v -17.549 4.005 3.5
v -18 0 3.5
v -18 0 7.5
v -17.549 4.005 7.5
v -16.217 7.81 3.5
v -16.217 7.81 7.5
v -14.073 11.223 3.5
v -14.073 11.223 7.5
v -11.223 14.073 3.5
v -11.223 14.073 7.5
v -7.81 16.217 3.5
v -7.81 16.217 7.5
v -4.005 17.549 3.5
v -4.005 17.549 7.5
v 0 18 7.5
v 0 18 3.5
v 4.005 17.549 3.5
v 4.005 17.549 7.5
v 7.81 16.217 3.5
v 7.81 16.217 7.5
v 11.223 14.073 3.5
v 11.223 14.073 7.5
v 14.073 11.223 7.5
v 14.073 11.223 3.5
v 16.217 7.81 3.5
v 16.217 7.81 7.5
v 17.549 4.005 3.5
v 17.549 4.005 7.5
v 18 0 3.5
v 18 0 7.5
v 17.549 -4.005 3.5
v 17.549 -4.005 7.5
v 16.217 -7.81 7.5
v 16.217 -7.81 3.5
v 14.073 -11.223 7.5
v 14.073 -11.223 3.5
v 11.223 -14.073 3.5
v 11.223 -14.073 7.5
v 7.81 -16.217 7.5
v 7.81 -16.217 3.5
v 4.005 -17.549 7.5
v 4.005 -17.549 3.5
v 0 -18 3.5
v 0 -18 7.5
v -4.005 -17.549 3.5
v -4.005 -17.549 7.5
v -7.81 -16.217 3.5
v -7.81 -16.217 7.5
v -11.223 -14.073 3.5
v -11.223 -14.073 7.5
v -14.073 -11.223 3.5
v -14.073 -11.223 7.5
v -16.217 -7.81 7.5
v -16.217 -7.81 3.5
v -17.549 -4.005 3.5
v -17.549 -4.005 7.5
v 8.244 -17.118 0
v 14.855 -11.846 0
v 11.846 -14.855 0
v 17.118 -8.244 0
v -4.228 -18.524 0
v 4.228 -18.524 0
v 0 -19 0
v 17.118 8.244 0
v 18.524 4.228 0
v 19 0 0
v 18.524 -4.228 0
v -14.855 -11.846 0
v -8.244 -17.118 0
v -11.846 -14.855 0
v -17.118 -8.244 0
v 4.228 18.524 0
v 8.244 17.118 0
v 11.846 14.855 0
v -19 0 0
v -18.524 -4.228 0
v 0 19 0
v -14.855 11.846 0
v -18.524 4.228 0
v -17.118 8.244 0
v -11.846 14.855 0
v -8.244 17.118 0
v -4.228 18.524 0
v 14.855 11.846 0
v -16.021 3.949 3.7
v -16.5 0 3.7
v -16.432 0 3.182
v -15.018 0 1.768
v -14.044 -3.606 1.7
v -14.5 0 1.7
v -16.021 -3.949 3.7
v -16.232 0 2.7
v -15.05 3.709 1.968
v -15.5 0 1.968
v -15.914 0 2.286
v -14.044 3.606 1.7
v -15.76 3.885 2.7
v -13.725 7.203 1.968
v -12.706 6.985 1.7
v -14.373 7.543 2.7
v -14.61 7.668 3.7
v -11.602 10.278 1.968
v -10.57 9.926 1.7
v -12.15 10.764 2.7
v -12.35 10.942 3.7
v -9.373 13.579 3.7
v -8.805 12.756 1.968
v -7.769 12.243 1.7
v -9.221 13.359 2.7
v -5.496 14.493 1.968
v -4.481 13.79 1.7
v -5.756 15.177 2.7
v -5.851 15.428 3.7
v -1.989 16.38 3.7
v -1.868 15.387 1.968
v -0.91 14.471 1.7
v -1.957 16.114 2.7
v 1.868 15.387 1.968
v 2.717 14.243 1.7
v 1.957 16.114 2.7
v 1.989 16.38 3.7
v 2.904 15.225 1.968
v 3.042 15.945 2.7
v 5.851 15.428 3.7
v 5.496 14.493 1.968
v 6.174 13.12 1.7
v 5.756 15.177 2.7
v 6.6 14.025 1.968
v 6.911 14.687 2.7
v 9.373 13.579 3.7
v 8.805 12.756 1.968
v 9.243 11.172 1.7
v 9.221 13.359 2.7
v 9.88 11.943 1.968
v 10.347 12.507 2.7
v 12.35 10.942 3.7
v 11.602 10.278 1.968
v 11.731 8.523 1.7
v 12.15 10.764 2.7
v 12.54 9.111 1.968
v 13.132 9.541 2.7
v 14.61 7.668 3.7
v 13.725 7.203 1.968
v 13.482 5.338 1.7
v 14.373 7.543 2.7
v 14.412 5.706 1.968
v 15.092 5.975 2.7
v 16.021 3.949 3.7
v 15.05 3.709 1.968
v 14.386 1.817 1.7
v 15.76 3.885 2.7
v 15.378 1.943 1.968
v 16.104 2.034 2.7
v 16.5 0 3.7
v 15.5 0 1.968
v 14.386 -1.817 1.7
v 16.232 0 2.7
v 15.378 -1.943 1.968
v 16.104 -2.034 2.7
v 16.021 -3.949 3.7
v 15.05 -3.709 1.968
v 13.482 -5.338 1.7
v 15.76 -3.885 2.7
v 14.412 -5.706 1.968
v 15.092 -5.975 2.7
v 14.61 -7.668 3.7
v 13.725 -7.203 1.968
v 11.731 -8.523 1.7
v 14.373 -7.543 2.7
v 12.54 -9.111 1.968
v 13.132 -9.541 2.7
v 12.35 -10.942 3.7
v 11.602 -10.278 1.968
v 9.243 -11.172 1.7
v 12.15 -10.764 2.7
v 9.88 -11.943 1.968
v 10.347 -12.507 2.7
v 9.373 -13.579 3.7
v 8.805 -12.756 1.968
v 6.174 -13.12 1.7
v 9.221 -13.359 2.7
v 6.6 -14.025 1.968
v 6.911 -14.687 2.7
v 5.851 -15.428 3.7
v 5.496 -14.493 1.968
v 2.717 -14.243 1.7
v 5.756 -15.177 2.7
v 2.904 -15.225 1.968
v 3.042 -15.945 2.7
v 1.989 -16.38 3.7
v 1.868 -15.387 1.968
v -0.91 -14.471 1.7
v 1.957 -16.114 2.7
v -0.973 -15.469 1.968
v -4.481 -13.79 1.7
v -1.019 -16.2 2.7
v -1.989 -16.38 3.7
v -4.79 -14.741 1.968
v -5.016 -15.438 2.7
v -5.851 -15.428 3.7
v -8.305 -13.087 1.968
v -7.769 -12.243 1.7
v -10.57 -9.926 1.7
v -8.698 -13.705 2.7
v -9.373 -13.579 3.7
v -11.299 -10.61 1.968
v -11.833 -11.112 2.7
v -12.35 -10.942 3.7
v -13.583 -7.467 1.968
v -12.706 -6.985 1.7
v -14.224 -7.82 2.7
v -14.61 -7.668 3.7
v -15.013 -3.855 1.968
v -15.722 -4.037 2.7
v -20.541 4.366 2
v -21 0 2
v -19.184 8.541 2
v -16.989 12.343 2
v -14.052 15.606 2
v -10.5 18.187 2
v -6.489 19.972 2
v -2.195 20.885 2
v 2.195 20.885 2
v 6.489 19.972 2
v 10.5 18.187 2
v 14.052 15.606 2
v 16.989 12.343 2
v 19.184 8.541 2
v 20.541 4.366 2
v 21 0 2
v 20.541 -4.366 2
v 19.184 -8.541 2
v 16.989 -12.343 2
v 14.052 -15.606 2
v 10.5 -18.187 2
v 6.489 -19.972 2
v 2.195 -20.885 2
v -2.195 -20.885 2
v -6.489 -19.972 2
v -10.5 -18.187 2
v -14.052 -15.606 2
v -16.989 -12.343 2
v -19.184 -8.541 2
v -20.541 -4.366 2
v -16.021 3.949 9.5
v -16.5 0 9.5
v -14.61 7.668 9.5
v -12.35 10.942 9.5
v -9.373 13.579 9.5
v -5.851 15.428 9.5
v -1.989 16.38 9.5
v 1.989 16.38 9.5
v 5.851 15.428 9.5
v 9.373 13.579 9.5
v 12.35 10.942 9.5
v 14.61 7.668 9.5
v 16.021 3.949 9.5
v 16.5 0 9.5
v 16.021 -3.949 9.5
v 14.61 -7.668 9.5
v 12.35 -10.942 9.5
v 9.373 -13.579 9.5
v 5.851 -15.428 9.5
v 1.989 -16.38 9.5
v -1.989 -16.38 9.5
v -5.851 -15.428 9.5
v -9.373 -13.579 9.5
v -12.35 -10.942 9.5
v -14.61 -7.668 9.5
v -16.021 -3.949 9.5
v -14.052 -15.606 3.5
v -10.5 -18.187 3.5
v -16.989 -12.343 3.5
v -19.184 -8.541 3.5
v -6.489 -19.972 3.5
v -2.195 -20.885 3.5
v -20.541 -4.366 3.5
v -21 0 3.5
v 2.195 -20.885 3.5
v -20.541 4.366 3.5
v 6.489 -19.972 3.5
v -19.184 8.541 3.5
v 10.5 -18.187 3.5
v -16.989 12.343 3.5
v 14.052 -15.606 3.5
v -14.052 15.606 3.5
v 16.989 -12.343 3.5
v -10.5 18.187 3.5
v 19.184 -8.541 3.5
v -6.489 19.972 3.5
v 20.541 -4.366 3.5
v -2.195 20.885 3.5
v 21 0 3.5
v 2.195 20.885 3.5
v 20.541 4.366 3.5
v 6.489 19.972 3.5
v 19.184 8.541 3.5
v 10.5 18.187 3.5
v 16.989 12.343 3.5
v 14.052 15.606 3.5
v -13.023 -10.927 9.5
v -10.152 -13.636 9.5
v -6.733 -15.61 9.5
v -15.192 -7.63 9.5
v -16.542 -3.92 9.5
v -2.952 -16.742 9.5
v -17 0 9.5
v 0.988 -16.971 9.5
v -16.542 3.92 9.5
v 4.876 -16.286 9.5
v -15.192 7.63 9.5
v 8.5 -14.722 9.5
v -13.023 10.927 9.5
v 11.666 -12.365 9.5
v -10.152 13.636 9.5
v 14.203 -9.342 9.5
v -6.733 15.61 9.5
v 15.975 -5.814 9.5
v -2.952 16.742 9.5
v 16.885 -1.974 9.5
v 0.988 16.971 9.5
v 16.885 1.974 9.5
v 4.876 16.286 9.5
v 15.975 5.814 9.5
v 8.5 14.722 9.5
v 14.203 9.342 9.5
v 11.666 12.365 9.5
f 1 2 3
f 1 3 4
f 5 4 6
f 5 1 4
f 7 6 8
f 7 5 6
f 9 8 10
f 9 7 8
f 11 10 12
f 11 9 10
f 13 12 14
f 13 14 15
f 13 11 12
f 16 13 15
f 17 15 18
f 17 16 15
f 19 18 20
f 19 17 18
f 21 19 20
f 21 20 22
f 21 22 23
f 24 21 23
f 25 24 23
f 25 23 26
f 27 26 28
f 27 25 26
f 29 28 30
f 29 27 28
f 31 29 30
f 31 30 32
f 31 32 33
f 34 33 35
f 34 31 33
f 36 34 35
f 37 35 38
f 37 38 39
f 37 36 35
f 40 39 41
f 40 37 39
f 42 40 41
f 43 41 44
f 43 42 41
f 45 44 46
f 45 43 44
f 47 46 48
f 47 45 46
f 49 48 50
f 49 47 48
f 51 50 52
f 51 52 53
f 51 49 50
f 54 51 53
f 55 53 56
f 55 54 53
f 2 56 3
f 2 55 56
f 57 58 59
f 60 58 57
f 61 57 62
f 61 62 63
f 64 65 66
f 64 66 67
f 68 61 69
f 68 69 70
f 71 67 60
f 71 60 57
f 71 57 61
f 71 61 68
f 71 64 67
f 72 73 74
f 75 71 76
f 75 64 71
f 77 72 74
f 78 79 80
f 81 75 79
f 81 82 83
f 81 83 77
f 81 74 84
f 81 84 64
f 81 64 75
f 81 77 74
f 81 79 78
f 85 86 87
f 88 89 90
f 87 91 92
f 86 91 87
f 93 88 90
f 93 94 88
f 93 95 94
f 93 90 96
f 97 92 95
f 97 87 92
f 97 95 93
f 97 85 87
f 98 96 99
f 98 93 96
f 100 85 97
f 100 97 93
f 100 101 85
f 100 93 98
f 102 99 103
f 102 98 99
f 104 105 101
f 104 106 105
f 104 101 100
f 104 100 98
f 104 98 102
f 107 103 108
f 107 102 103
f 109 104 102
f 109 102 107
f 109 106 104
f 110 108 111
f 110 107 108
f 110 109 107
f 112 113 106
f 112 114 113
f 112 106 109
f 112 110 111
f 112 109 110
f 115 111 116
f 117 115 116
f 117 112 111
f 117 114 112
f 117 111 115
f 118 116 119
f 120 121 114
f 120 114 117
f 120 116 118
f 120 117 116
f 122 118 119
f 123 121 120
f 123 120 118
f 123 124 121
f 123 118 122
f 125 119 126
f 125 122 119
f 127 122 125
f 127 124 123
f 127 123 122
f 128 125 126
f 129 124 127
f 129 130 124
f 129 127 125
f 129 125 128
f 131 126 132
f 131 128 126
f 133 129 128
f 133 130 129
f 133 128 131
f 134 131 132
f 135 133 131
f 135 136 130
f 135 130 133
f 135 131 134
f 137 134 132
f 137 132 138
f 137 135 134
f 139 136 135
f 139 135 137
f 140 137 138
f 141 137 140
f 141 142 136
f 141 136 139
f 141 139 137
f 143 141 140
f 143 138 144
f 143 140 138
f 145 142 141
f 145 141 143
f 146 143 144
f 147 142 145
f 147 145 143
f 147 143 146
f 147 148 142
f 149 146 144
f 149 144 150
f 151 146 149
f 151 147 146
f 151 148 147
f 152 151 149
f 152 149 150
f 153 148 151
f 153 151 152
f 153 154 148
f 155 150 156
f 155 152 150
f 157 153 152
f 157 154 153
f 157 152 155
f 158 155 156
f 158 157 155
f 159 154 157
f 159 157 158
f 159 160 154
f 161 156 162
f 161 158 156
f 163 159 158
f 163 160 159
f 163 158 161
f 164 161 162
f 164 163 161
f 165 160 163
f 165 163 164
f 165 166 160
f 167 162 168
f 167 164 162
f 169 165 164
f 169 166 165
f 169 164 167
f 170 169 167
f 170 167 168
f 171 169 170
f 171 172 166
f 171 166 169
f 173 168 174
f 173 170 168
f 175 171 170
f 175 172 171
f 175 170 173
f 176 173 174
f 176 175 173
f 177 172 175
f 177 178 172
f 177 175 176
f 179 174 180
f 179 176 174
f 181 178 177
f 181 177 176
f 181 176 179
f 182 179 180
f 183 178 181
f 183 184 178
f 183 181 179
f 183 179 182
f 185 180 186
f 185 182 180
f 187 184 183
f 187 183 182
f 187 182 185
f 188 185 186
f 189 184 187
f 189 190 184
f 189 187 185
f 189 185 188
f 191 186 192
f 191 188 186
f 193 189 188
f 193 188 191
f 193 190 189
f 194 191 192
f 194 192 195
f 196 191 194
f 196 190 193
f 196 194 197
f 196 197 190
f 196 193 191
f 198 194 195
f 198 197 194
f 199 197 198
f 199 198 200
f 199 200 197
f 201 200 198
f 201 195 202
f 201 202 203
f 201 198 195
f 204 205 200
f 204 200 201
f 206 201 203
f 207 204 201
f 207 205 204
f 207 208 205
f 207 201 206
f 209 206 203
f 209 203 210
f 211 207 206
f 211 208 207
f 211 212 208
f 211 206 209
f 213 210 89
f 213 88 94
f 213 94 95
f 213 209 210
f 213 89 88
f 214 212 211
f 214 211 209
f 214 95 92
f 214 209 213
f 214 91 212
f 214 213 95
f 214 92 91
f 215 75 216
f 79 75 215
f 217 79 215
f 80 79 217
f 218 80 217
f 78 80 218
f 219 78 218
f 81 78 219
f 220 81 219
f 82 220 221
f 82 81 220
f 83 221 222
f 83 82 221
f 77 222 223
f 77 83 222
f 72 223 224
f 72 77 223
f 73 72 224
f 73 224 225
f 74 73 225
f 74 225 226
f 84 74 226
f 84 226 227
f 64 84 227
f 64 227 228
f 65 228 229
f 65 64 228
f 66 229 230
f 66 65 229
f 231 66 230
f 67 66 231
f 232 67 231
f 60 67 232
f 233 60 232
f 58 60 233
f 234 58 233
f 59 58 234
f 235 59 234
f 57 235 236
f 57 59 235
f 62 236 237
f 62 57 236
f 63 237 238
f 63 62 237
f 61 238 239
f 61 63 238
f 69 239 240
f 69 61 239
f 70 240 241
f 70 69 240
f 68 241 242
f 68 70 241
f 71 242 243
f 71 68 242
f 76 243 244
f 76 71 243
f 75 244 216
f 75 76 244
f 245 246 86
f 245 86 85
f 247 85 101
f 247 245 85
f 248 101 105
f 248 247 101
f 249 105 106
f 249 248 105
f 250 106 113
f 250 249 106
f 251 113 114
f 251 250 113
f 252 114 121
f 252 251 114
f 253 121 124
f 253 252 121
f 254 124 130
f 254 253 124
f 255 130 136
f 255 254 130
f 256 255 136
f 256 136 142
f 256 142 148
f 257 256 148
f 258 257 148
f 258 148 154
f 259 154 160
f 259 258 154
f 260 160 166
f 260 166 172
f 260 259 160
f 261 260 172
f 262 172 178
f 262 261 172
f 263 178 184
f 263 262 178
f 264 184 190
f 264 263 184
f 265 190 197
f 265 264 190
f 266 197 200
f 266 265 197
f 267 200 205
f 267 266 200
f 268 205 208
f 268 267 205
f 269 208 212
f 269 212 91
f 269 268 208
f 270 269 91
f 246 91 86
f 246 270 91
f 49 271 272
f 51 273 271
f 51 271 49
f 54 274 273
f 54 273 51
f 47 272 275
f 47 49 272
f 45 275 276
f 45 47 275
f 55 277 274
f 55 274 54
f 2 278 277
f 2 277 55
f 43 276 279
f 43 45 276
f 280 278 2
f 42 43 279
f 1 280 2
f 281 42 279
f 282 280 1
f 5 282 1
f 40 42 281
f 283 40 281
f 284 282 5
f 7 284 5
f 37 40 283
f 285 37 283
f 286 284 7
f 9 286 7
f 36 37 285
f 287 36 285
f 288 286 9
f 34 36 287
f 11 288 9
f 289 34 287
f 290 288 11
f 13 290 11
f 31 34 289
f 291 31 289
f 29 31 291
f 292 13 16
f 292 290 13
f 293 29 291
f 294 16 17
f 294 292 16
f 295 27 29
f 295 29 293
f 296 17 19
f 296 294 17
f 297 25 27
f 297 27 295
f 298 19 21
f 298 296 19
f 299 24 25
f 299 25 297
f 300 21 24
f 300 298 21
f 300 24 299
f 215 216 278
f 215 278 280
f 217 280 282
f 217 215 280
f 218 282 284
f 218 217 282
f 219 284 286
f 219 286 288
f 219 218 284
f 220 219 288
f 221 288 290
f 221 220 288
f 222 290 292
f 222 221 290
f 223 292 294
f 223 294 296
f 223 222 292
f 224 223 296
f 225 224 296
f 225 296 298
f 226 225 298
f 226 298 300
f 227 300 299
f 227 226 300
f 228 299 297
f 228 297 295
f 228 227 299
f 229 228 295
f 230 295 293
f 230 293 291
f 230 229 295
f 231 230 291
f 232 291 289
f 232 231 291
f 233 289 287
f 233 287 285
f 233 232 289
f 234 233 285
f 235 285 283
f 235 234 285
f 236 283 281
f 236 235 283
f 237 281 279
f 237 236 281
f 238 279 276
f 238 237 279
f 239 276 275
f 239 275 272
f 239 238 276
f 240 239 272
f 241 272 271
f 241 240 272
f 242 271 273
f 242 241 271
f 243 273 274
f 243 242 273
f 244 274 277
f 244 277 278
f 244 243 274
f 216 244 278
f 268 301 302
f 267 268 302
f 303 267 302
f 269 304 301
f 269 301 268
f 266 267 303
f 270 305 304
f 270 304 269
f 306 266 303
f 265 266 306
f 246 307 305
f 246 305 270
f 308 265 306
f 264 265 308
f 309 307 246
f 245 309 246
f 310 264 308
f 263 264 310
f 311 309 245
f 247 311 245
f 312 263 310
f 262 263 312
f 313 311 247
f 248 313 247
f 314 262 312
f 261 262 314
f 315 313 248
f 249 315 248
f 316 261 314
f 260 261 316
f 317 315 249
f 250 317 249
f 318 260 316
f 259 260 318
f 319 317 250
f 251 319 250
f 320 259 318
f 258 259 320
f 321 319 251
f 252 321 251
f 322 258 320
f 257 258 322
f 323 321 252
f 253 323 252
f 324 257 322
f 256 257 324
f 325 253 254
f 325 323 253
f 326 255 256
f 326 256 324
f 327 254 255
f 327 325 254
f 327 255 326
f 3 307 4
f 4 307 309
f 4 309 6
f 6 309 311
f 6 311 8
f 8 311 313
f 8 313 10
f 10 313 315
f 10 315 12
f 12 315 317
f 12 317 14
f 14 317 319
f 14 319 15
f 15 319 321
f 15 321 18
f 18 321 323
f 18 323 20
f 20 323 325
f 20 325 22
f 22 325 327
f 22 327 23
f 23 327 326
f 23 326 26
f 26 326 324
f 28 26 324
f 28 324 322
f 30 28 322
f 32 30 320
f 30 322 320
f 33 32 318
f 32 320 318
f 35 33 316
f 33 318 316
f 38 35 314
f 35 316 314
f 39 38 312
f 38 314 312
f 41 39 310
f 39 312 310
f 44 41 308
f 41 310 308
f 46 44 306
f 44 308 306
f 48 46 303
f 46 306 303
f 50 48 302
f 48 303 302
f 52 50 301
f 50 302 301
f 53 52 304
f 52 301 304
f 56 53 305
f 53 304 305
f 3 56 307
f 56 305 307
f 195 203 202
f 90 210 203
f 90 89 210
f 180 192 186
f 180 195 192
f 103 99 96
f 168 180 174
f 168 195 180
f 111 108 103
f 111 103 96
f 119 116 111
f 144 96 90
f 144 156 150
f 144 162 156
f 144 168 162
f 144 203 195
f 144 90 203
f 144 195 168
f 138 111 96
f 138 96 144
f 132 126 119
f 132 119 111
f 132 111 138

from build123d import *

# Parameters (mm, degrees)
F2_R     = 2
F3_SIZE  = 2
F4_SIZE2 = 1
F4_SIZE  = 2


with BuildPart() as f1:
    # F0 (on Front) → F1 (revolve)
    with BuildSketch(Plane.XZ):
        Polygon((-18, 3.5), (-21, 3.5), (-21, 0), (0, 0), (0, 1.7), (-16.5, 1.7), (-16.5, 9.5), (-18, 9.5), align=None)
    revolve(axis=Axis((0, 0, 0.85), (0, 0, -1)))

    # F2
    f2_edges = [f1.edges().sort_by_distance(p)[0] for p in [
        (16.5, 0, 1.7),
    ]]
    fillet(f2_edges, radius=F2_R)

    # F3
    f3_edges = [f1.edges().sort_by_distance(p)[0] for p in [
        (21, 0, 0),
    ]]
    chamfer(f3_edges, length=F3_SIZE)

    # F4
    f4_edges = [f1.edges().sort_by_distance(p)[0] for p in [
        (18, 0, 9.5),
    ]]
    f4_side = f1.faces().sort_by_distance((18, 0, 6.5))[0]
    chamfer(f4_edges, length=F4_SIZE, length2=F4_SIZE2, reference=f4_side)


solid = f1.part
